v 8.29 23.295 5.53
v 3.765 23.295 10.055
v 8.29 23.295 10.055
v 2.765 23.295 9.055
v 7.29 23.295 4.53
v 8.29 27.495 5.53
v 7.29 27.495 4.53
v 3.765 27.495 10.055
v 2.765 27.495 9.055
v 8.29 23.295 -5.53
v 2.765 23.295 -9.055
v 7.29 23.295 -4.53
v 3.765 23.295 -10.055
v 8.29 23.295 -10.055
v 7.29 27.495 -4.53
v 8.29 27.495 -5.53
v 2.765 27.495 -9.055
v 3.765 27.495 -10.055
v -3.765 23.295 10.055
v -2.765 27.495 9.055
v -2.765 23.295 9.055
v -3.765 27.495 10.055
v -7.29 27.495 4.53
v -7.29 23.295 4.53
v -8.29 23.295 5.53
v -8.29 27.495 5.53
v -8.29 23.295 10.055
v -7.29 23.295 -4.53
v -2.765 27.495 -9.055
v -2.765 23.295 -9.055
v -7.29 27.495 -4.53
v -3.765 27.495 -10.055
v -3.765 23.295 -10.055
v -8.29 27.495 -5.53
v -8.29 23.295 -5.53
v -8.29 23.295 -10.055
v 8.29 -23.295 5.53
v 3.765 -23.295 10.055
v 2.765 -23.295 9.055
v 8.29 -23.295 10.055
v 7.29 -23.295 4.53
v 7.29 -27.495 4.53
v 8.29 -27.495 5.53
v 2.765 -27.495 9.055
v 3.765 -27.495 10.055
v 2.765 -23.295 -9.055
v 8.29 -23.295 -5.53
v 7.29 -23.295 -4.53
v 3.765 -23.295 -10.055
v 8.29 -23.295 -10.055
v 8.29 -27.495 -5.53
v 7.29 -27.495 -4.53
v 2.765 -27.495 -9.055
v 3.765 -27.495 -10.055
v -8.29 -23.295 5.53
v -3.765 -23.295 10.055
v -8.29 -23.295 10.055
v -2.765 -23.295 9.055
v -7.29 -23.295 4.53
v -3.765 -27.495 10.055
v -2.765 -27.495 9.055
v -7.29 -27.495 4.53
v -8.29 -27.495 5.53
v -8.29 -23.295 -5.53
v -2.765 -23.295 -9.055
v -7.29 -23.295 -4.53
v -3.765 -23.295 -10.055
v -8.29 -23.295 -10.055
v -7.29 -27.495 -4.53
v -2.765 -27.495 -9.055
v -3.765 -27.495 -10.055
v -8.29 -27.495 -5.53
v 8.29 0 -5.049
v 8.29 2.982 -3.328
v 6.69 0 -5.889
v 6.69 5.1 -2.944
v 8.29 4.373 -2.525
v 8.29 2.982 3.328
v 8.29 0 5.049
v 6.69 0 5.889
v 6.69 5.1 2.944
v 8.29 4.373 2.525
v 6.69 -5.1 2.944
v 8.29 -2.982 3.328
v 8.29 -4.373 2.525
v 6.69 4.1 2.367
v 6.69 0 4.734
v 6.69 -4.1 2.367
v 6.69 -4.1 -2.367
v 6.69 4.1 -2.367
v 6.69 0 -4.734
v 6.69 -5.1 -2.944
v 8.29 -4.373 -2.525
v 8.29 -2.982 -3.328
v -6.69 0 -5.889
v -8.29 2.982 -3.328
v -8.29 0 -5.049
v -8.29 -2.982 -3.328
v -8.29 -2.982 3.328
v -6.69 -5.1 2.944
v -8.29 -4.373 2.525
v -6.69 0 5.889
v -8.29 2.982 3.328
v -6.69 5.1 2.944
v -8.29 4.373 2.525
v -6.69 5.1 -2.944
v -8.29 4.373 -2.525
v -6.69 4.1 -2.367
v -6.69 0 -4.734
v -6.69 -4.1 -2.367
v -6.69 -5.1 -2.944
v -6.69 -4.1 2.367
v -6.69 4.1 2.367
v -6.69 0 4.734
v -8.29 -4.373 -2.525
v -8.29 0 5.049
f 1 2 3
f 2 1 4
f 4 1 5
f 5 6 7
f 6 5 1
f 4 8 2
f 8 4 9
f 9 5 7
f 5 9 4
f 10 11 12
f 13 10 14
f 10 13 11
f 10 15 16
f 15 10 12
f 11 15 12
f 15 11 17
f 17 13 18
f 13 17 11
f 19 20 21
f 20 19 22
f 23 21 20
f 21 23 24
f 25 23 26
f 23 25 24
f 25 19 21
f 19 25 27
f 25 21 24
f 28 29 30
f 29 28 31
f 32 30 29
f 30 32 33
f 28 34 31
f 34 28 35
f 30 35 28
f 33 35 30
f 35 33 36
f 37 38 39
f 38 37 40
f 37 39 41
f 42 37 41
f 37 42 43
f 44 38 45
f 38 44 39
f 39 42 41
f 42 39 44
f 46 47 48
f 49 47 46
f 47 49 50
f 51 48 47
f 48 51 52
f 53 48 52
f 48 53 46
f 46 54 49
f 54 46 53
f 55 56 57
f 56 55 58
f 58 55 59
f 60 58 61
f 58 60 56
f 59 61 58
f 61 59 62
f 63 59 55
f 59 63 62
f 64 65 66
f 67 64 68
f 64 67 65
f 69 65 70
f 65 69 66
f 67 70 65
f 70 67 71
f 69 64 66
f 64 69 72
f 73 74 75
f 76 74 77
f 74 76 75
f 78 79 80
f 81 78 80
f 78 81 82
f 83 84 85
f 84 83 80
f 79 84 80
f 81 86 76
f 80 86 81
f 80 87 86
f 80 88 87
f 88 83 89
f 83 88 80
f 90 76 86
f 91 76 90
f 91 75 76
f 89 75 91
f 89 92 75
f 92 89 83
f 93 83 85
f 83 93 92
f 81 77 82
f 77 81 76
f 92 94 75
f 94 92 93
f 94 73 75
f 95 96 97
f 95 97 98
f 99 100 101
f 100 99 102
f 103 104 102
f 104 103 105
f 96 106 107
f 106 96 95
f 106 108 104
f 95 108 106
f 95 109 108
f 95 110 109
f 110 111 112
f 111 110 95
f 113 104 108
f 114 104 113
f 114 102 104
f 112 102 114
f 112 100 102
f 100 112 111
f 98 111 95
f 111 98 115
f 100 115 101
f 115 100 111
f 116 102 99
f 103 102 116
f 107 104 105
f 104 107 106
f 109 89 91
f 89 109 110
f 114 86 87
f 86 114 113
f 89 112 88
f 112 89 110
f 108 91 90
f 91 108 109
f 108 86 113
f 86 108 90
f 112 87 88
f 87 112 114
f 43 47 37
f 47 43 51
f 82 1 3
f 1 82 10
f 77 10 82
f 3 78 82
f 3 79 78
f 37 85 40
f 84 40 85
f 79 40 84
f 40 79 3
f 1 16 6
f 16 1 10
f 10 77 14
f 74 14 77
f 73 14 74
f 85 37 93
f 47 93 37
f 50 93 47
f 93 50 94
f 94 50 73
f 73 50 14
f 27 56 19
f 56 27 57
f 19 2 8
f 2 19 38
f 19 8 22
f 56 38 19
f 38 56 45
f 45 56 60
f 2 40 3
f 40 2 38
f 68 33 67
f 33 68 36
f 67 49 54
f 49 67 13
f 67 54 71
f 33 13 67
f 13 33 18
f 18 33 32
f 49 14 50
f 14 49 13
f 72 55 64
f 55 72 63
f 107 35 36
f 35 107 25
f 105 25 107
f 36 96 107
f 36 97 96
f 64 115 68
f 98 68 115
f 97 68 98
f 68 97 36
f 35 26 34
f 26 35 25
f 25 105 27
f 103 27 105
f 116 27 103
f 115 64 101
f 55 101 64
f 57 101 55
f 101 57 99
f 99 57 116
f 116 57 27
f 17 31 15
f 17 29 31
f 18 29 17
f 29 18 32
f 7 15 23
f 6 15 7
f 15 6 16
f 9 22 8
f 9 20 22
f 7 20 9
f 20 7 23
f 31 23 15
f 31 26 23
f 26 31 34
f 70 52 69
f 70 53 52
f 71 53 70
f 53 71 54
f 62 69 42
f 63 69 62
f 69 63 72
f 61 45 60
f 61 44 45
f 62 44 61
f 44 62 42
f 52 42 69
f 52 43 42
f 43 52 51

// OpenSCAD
$fn = 96;

// Bounding box (X x Y x Z)
W = 16.58;   // X (thickness)
L = 54.99;   // Y (length)
H = 20.11;   // Z (height)

// Hole location (near mid-length)
hole_center_x = 0.0;
hole_center_y = 0.0;
hole_center_z = 0.0;

// Hex through-hole (across flats)
hex_AF = 8.0;
hex_clearance = 0.2;

// Shallow V countersink on both faces (around the hex hole)
csk_depth_each_side = 1.0;
csk_extra_AF = 2.0;

// End corner chamfer/relief
end_chamfer = 2.0;     // chamfer size (mm)
end_chamfer_len = 3.0; // how far from each end along length (mm)

// Optional subtle overall edge chamfer
edge_chamfer = 0.0;

// Robust overlap for boolean ops (keeps cuts from being coplanar)
op_overlap = 1.2;

// --- Helpers ---
function hex_R_from_AF(af) = af / sqrt(3); // circumradius for regular hex given across-flats

module hex_prism_x(af, len_x) {
    // Hex prism oriented along X (transverse through-hole)
    R = hex_R_from_AF(af);
    rotate([0, 90, 0])
        cylinder(h=len_x, r=R, $fn=6, center=true);
}

module v_countersink_x(af_small, af_large, depth_each_side) {
    // Two tapered hex frustums opening out at the +/-X faces
    Rsmall = hex_R_from_AF(af_small);
    Rlarge = hex_R_from_AF(af_large);

    // Make each frustum extend slightly past the face to avoid coplanar artifacts.
    // Place so the OUTER (large) end is at the face (x=±W/2), tapering inward.
    h = depth_each_side + op_overlap;
    inset = depth_each_side/2; // center of frustum measured from face inward

    union() {
        // +X face countersink (large at +X face)
        translate([ +W/2 - inset, 0, 0 ])
            rotate([0, 90, 0])
                cylinder(h=h, r1=Rlarge, r2=Rsmall, $fn=6, center=true);

        // -X face countersink (large at -X face)
        translate([ -W/2 + inset, 0, 0 ])
            rotate([0, 90, 0])
                cylinder(h=h, r1=Rsmall, r2=Rlarge, $fn=6, center=true);
    }
}

module end_corner_chamfers() {
    // Subtract 4 chamfer cuts per end (one per XZ corner), over end_chamfer_len in Y.
    cham = end_chamfer;
    leny = end_chamfer_len;

    // Oversize cutters so they fully intersect the body
    cut_x = 2*cham + 2*op_overlap;
    cut_z = 2*cham + 2*op_overlap;
    cut_y = leny + 2*op_overlap;

    module corner_cut(sx, sz, ysign) {
        // Position the cutter so it intersects the corner region at each end.
        // Rotate about Y so it creates a 45° chamfer in the XZ corner.
        translate([
            sx*(W/2 - cham/2),
            ysign*(L/2 - leny/2),
            sz*(H/2 - cham/2)
        ])
        rotate([0, 45, 0])
            cube([cut_x, cut_y, cut_z], center=true);
    }

    union() {
        // +Y end
        corner_cut(+1, +1, +1);
        corner_cut(+1, -1, +1);
        corner_cut(-1, +1, +1);
        corner_cut(-1, -1, +1);

        // -Y end
        corner_cut(+1, +1, -1);
        corner_cut(+1, -1, -1);
        corner_cut(-1, +1, -1);
        corner_cut(-1, -1, -1);
    }
}

module overall_edge_chamfers() {
    if (edge_chamfer > 0) {
        e = edge_chamfer;

        // Cut along XZ edges (running in Y)
        for (sx = [-1, 1], sz = [-1, 1]) {
            translate([ sx*(W/2 - e/2), 0, sz*(H/2 - e/2) ])
                rotate([0, 45, 0])
                    cube([2*e + 2*op_overlap, L + 2*op_overlap, 2*e + 2*op_overlap], center=true);
        }

        // Cut along XY edges (running in Z)
        for (sx = [-1, 1], sy = [-1, 1]) {
            translate([ sx*(W/2 - e/2), sy*(L/2 - e/2), 0 ])
                rotate([45, 0, 0])
                    cube([2*e + 2*op_overlap, 2*e + 2*op_overlap, H + 2*op_overlap], center=true);
        }

        // Cut along YZ edges (running in X)
        for (sy = [-1, 1], sz = [-1, 1]) {
            translate([ 0, sy*(L/2 - e/2), sz*(H/2 - e/2) ])
                rotate([0, 0, 45])
                    cube([W + 2*op_overlap, 2*e + 2*op_overlap, 2*e + 2*op_overlap], center=true);
        }
    }
}

// --- Main model ---
module spacer_block() {
    difference() {
        // Main bar
        cube([W, L, H], center=true);

        // End chamfer/relieved corners (both ends)
        end_corner_chamfers();

        // Optional overall edge chamfers
        overall_edge_chamfers();

        // Transverse hex through-hole + shallow V countersinks on both faces
        translate([hole_center_x, hole_center_y, hole_center_z]) {
            // Through-hole: ensure it fully passes through X thickness
            hex_prism_x(hex_AF + hex_clearance, W + 2*op_overlap);

            // V-shaped countersink/counterbore on both +/-X faces
            v_countersink_x(
                hex_AF + hex_clearance,
                hex_AF + hex_clearance + csk_extra_AF,
                csk_depth_each_side
            );
        }
    }
}

spacer_block();
